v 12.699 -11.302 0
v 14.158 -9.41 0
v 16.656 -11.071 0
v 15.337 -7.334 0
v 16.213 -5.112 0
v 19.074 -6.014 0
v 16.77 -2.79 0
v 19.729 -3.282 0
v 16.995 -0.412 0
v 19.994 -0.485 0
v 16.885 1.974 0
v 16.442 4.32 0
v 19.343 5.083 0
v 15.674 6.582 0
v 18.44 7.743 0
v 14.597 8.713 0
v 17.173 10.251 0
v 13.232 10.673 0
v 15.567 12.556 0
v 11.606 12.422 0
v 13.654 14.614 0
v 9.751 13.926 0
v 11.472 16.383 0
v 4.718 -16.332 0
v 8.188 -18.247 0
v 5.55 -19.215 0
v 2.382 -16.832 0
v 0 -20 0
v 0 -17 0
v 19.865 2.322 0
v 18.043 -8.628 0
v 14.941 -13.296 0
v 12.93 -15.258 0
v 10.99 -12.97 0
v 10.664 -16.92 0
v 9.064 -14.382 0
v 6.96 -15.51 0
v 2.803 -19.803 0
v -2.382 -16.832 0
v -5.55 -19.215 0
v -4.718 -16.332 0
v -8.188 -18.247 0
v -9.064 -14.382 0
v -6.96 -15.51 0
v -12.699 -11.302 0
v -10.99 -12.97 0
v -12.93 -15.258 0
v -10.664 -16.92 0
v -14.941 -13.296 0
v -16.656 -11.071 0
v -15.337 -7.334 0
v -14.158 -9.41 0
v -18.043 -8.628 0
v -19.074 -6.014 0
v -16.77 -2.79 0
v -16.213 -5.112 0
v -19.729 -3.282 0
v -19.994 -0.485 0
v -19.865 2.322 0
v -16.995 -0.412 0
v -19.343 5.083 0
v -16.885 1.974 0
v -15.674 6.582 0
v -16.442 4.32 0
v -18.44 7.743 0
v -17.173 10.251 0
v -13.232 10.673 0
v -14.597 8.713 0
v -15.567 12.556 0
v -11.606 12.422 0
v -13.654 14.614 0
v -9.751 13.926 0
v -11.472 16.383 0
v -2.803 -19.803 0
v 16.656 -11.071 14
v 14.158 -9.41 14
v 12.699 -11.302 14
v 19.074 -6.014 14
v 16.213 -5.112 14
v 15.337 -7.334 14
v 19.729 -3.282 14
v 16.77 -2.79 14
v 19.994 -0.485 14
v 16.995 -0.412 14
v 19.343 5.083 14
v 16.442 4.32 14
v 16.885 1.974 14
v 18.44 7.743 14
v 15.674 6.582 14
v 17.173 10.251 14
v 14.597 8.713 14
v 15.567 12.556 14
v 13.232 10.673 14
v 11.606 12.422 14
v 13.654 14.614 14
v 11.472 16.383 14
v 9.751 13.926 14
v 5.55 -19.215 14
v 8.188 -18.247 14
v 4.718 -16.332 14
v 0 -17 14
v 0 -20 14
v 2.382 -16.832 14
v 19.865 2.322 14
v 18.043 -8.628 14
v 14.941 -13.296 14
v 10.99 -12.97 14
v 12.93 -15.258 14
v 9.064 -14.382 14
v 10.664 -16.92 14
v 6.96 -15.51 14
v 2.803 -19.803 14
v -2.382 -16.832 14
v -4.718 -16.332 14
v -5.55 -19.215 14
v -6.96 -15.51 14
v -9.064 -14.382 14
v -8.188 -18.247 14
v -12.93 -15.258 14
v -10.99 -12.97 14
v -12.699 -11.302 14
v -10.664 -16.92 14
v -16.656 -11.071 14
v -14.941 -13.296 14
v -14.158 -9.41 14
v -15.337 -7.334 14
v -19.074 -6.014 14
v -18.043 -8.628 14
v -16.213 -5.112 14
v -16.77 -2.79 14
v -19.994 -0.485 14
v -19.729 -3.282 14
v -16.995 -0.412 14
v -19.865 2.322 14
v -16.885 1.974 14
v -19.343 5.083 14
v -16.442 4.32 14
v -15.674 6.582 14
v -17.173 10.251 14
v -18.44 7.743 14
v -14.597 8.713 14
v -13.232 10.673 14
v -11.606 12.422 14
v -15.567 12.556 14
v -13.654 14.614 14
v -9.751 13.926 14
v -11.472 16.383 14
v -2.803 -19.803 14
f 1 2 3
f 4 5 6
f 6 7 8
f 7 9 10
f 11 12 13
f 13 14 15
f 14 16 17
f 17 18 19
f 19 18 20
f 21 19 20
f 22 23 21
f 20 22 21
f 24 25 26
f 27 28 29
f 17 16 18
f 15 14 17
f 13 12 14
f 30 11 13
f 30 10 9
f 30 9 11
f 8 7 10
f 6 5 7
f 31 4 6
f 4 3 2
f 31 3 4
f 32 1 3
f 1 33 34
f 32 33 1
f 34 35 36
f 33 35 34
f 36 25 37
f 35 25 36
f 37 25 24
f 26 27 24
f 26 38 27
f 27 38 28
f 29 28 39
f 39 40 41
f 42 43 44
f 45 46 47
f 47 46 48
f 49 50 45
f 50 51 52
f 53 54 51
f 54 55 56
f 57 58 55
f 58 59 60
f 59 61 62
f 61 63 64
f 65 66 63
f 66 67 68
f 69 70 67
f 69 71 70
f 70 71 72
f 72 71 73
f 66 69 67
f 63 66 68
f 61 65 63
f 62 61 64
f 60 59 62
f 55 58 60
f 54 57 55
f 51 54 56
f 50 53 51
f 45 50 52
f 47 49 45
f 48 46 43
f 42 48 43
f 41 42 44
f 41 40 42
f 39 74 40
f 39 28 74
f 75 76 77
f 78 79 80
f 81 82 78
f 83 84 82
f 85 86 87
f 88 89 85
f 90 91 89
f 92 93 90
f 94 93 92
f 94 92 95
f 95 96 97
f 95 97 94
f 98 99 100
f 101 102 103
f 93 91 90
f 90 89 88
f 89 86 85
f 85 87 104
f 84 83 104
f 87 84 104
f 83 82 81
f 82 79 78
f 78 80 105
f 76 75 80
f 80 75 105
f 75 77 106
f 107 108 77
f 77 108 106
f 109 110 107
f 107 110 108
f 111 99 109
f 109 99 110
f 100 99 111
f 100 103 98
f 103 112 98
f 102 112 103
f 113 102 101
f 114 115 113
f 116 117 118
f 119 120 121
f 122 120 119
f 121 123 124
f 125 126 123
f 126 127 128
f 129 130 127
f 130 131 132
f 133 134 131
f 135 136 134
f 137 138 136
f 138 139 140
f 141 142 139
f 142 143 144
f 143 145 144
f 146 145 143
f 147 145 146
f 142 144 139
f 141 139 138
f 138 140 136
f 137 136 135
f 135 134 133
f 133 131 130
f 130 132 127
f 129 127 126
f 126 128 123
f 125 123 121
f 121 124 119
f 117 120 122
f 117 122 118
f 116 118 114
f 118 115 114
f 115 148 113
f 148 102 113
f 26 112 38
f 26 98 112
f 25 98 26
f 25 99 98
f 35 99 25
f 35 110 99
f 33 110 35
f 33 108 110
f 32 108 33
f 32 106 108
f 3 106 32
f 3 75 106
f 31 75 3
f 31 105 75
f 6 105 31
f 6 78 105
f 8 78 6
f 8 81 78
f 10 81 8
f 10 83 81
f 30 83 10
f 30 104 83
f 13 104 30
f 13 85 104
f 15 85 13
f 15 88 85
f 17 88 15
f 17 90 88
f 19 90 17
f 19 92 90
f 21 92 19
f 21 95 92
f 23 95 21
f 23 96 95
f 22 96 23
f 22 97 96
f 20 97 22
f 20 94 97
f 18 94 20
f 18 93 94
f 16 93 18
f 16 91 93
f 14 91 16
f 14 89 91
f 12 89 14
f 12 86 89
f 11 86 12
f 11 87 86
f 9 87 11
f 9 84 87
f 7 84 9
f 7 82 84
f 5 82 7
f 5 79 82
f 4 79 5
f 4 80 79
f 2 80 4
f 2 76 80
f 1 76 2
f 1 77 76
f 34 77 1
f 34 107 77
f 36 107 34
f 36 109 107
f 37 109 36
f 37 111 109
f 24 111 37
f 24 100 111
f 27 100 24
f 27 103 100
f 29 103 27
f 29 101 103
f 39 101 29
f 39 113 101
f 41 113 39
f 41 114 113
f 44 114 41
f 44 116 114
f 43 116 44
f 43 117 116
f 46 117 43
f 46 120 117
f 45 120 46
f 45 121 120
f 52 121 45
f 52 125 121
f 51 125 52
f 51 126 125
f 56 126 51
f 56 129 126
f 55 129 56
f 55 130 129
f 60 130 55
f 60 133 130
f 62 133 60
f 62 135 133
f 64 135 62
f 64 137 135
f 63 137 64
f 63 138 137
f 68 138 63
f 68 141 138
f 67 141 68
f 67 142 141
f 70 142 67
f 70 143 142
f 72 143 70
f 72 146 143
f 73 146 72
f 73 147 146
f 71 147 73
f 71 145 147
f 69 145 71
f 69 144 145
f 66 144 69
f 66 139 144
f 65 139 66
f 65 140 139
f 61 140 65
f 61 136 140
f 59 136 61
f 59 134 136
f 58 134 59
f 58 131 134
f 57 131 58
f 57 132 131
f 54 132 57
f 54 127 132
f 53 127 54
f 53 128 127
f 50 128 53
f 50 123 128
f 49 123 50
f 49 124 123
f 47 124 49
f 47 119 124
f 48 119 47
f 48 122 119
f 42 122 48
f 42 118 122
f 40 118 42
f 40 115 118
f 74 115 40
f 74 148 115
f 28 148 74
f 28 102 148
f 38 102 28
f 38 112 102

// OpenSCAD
$fn = 32;

// ----------------------------------------------------------------------
// Spring clip: 40 mm outside, 3 mm band, 70 degree opening
// ----------------------------------------------------------------------

// --- parameters (mm) ---
outer_r = 20;             // clip outside radius
inner_r = 17;             // clip bore radius
band = 3;                 // band thickness
clip_w = 14;              // clip width
opening = 70;             // opening angle

clip_profile = [[-11.472, 16.383], [-13.654, 14.614], [-15.567, 12.556], [-17.173, 10.251], [-18.44, 7.743], [-19.343, 5.083], [-19.865, 2.322], [-19.994, -0.485], [-19.729, -3.282], [-19.074, -6.014], [-18.043, -8.628], [-16.656, -11.071], [-14.941, -13.296], [-12.93, -15.258], [-10.664, -16.92], [-8.188, -18.247], [-5.55, -19.215], [-2.803, -19.803], [0, -20], [2.803, -19.803], [5.55, -19.215], [8.188, -18.247], [10.664, -16.92], [12.93, -15.258], [14.941, -13.296], [16.656, -11.071], [18.043, -8.628], [19.074, -6.014], [19.729, -3.282], [19.994, -0.485], [19.865, 2.322], [19.343, 5.083], [18.44, 7.743], [17.173, 10.251], [15.567, 12.556], [13.654, 14.614], [11.472, 16.383], [9.751, 13.926], [11.606, 12.422], [13.232, 10.673], [14.597, 8.713], [15.674, 6.582], [16.442, 4.32], [16.885, 1.974], [16.995, -0.412], [16.77, -2.79], [16.213, -5.112], [15.337, -7.334], [14.158, -9.41], [12.699, -11.302], [10.99, -12.97], [9.064, -14.382], [6.96, -15.51], [4.718, -16.332], [2.382, -16.832], [0, -17], [-2.382, -16.832], [-4.718, -16.332], [-6.96, -15.51], [-9.064, -14.382], [-10.99, -12.97], [-12.699, -11.302], [-14.158, -9.41], [-15.337, -7.334], [-16.213, -5.112], [-16.77, -2.79], [-16.995, -0.412], [-16.885, 1.974], [-16.442, 4.32], [-15.674, 6.582], [-14.597, 8.713], [-13.232, 10.673], [-11.606, 12.422], [-9.751, 13.926]];

difference() {
  union() {
    linear_extrude(height = clip_w) polygon(clip_profile);
  }
}
